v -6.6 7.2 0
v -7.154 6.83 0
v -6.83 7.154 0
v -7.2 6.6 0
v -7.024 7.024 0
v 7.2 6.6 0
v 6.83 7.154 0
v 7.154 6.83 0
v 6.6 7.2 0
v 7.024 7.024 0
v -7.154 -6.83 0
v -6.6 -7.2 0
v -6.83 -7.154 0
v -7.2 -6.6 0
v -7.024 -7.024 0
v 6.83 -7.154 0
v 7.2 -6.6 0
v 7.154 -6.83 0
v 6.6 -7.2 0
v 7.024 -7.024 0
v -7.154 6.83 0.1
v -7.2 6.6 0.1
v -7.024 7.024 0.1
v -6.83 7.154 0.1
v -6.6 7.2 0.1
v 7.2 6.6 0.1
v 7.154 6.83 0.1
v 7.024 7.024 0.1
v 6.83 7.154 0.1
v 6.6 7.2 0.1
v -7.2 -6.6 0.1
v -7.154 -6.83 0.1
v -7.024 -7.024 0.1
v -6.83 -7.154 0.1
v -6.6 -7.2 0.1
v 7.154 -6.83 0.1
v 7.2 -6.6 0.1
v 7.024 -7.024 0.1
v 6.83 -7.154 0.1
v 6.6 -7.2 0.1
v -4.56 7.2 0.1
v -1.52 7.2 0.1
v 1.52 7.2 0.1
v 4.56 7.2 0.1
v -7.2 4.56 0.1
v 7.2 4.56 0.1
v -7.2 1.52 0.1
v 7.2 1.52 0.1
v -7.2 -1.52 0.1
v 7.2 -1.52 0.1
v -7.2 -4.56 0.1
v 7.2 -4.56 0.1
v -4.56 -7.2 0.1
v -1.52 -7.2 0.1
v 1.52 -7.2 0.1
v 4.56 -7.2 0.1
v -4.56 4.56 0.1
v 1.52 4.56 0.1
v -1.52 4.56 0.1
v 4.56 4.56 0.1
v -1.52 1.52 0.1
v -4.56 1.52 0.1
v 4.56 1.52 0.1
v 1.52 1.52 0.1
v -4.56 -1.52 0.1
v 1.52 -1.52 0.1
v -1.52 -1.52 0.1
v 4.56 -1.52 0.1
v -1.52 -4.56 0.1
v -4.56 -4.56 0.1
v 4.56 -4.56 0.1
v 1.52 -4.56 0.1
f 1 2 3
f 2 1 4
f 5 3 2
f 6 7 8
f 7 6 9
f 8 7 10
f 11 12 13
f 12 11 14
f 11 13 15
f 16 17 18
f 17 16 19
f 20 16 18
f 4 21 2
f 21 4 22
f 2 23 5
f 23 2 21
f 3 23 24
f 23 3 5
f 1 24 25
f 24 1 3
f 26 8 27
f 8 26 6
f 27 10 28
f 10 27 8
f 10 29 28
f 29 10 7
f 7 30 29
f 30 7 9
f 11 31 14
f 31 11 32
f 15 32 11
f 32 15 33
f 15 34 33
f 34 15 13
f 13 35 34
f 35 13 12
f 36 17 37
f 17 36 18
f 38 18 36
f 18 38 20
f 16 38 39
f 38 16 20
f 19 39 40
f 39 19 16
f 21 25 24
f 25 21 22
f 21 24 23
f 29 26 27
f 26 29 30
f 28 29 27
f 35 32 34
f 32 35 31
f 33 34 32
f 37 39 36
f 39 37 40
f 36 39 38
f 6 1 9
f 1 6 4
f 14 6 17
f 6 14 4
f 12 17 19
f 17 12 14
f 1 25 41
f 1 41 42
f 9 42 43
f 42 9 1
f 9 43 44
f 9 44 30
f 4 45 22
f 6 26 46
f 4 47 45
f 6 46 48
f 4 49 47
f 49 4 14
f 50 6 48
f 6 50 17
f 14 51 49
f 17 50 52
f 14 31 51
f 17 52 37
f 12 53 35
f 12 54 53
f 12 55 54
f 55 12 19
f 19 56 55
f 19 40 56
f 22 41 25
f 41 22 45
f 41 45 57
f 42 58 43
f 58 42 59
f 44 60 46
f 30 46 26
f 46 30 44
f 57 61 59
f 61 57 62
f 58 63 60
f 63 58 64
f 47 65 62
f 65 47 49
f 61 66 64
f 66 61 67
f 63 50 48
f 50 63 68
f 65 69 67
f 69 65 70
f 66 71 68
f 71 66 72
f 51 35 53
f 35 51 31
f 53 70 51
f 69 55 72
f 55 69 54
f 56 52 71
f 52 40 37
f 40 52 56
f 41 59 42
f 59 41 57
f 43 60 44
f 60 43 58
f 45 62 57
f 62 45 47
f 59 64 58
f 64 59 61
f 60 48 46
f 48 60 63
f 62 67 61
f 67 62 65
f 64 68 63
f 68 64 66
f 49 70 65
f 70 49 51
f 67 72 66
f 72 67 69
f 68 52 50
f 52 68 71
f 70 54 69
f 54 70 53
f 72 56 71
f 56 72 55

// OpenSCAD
// file: ../p/1-4cyli.scad
use <../lib.scad>
function ldraw_lib__1_4cyli() = [
// 0 Cylinder 0.25
// 0 Name: 1-4cyli.dat
// 0 Author: James Jessiman
// 0 !LDRAW_ORG Primitive UPDATE 2012-01
// 0 !LICENSE Licensed under CC BY 4.0 : see CAreadme.txt
// 
// 0 BFC CERTIFY CCW
  [0,"BFC","CERTIFY"],
  [0,"BFC","CCW"],
// 
// 0 !HISTORY 2002-03-23 [sbliss] Added BFC statement.
// 0 !HISTORY 2002-04-25 [PTadmin] Official Update 2002-02
// 0 !HISTORY 2007-06-22 [PTadmin] Header formatted for Contributor Agreement
// 0 !HISTORY 2008-07-01 [PTadmin] Official Update 2008-01
// 0 !HISTORY 2012-02-16 [Philo] Changed to CCW
// 0 !HISTORY 2012-03-30 [PTadmin] Official Update 2012-01
// 
// 
// 4 16 1 1 0 0.9239 1 0.3827 0.9239 0 0.3827 1 0 0
  [4,16,1,1,0,0.9239,1,0.3827,0.9239,0,0.3827,1,0,0],
// 5 24 1 0 0 1 1 0 0.9239 0 0.3827 1 0 -1
  [5,24,1,0,0,1,1,0,0.9239,0,0.3827,1,0,-1],
// 4 16 0.9239 1 0.3827 0.7071 1 0.7071 0.7071 0 0.7071 0.9239 0 0.3827
  [4,16,0.9239,1,0.3827,0.7071,1,0.7071,0.7071,0,0.7071,0.9239,0,0.3827],
// 5 24 0.9239 0 0.3827 0.9239 1 0.3827 0.7071 0 0.7071 1 0 0
  [5,24,0.9239,0,0.3827,0.9239,1,0.3827,0.7071,0,0.7071,1,0,0],
// 4 16 0.7071 1 0.7071 0.3827 1 0.9239 0.3827 0 0.9239 0.7071 0 0.7071
  [4,16,0.7071,1,0.7071,0.3827,1,0.9239,0.3827,0,0.9239,0.7071,0,0.7071],
// 5 24 0.7071 0 0.7071 0.7071 1 0.7071 0.3827 0 0.9239 0.9239 0 0.3827
  [5,24,0.7071,0,0.7071,0.7071,1,0.7071,0.3827,0,0.9239,0.9239,0,0.3827],
// 4 16 0.3827 1 0.9239 0 1 1 0 0 1 0.3827 0 0.9239
  [4,16,0.3827,1,0.9239,0,1,1,0,0,1,0.3827,0,0.9239],
// 5 24 0.3827 0 0.9239 0.3827 1 0.9239 0 0 1 0.7071 0 0.7071
  [5,24,0.3827,0,0.9239,0.3827,1,0.9239,0,0,1,0.7071,0,0.7071],
// 5 24 0 0 1 0 1 1 0.3827 0 0.9239 -1 0 1
  [5,24,0,0,1,0,1,1,0.3827,0,0.9239,-1,0,1],
];
module ldraw_lib__1_4cyli(step=0, col=false, unit=2/5, alt=false, line=0.2, solid=!$preview)
    makepoly(ldraw_lib__1_4cyli(), step=step, col=col, unit=unit, alt=alt, line=line, solid=solid);
ldraw_lib__1_4cyli(line=0.2);
// file: ../p/1-4chrd.scad
use <../lib.scad>
function ldraw_lib__1_4chrd() = [
// 0 Chord 0.25
// 0 Name: 1-4chrd.dat
// 0 Author: Tony Hafner [hafhead]
// 0 !LDRAW_ORG Primitive UPDATE 2012-02
// 0 !LICENSE Licensed under CC BY 2.0 and CC BY 4.0 : see CAreadme.txt
// 
// 0 BFC CERTIFY CCW
  [0,"BFC","CERTIFY"],
  [0,"BFC","CCW"],
// 
// 0 !HISTORY 2004-04-22 [PTadmin] Official Update 2004-02
// 0 !HISTORY 2007-10-09 [PTadmin] Header formatted for Contributor Agreement
// 0 !HISTORY 2008-07-01 [PTadmin] Official Update 2008-01
// 0 !HISTORY 2012-08-02 [MMR1988] Re-creation with PrimGen2 and Rectifier
// 0 !HISTORY 2012-08-09 [PTadmin] Official Update 2012-02
// 
// 
// 4 16 0.9239 0 0.3827 0.3827 0 0.9239 0 0 1 1 0 0
  [4,16,0.9239,0,0.3827,0.3827,0,0.9239,0,0,1,1,0,0],
// 3 16 0.7071 0 0.7071 0.3827 0 0.9239 0.9239 0 0.3827
  [3,16,0.7071,0,0.7071,0.3827,0,0.9239,0.9239,0,0.3827],
];
module ldraw_lib__1_4chrd(step=0, col=false, unit=2/5, alt=false, line=0.2, solid=!$preview)
    makepoly(ldraw_lib__1_4chrd(), step=step, col=col, unit=unit, alt=alt, line=line, solid=solid);
ldraw_lib__1_4chrd(line=0.2);
// main file
use <../lib.scad>
use <../p/1-4chrd.scad>
use <../p/1-4cyli.scad>
function ldraw_lib__6142617z() = [
// 0 Sticker  1.8 x  1.8 Chequered
// 0 Name: 6142617z.dat
// 0 Author: Massimo Maso [Sirio]
// 0 !LDRAW_ORG Part UPDATE 2023-02
// 0 !LICENSE Licensed under CC BY 4.0 : see CAreadme.txt
// 
// 0 BFC CERTIFY CCW
  [0,"BFC","CERTIFY"],
  [0,"BFC","CCW"],
// 
// 0 !KEYWORDS Camaro, Chevrolet, Drag, Race, Set 75874, Speed Champions, SS, Z/28
// 
// 0 !HISTORY 2023-04-17 [OrionP] Official Update 2023-02
// 
// 
// 0 // Primitives
// 
// 1 16 -16.5 0 16.5 -1.5 0 0 0 -1 0 0 0 1.5 1-4chrd.dat
  [1,16,-16.5,0,16.5,-1.5,0,0,0,-1,0,0,0,1.5, ldraw_lib__1_4chrd()],
// 1 16 16.5 0 16.5 1.5 0 0 0 -1 0 0 0 1.5 1-4chrd.dat
  [1,16,16.5,0,16.5,1.5,0,0,0,-1,0,0,0,1.5, ldraw_lib__1_4chrd()],
// 1 16 -16.5 0 -16.5 -1.5 0 0 0 -1 0 0 0 -1.5 1-4chrd.dat
  [1,16,-16.5,0,-16.5,-1.5,0,0,0,-1,0,0,0,-1.5, ldraw_lib__1_4chrd()],
// 1 16 16.5 0 -16.5 1.5 0 0 0 -1 0 0 0 -1.5 1-4chrd.dat
  [1,16,16.5,0,-16.5,1.5,0,0,0,-1,0,0,0,-1.5, ldraw_lib__1_4chrd()],
// 1 16 -16.5 0 16.5 -1.5 0 0 0 -.25 0 0 0 1.5 1-4cyli.dat
  [1,16,-16.5,0,16.5,-1.5,0,0,0,-.25,0,0,0,1.5, ldraw_lib__1_4cyli()],
// 1 16 16.5 0 16.5 1.5 0 0 0 -.25 0 0 0 1.5 1-4cyli.dat
  [1,16,16.5,0,16.5,1.5,0,0,0,-.25,0,0,0,1.5, ldraw_lib__1_4cyli()],
// 1 16 -16.5 0 -16.5 -1.5 0 0 0 -.25 0 0 0 -1.5 1-4cyli.dat
  [1,16,-16.5,0,-16.5,-1.5,0,0,0,-.25,0,0,0,-1.5, ldraw_lib__1_4cyli()],
// 1 16 16.5 0 -16.5 1.5 0 0 0 -.25 0 0 0 -1.5 1-4cyli.dat
  [1,16,16.5,0,-16.5,1.5,0,0,0,-.25,0,0,0,-1.5, ldraw_lib__1_4cyli()],
// 1 0 -16.5 -.25 16.5 -1.5 0 0 0 1 0 0 0 1.5 1-4chrd.dat
  [1,0,-16.5,-.25,16.5,-1.5,0,0,0,1,0,0,0,1.5, ldraw_lib__1_4chrd()],
// 1 0 16.5 -.25 16.5 1.5 0 0 0 1 0 0 0 1.5 1-4chrd.dat
  [1,0,16.5,-.25,16.5,1.5,0,0,0,1,0,0,0,1.5, ldraw_lib__1_4chrd()],
// 1 0 -16.5 -.25 -16.5 -1.5 0 0 0 1 0 0 0 -1.5 1-4chrd.dat
  [1,0,-16.5,-.25,-16.5,-1.5,0,0,0,1,0,0,0,-1.5, ldraw_lib__1_4chrd()],
// 1 0 16.5 -.25 -16.5 1.5 0 0 0 1 0 0 0 -1.5 1-4chrd.dat
  [1,0,16.5,-.25,-16.5,1.5,0,0,0,1,0,0,0,-1.5, ldraw_lib__1_4chrd()],
// 0 // Bottom face
// 4 16 16.5 0 18 18 0 16.5 -18 0 16.5 -16.5 0 18
  [4,16,16.5,0,18,18,0,16.5,-18,0,16.5,-16.5,0,18],
// 4 16 18 0 16.5 18 0 -16.5 -18 0 -16.5 -18 0 16.5
  [4,16,18,0,16.5,18,0,-16.5,-18,0,-16.5,-18,0,16.5],
// 4 16 16.5 0 -18 -16.5 0 -18 -18 0 -16.5 18 0 -16.5
  [4,16,16.5,0,-18,-16.5,0,-18,-18,0,-16.5,18,0,-16.5],
// 0 // Lateral face
// 3 16 -16.5 0 18 -16.5 -.25 18 -11.4 -.25 18
  [3,16,-16.5,0,18,-16.5,-.25,18,-11.4,-.25,18],
// 3 16 -16.5 0 18 -11.4 -.25 18 -3.8 -.25 18
  [3,16,-16.5,0,18,-11.4,-.25,18,-3.8,-.25,18],
// 4 16 -16.5 0 18 -3.8 -.25 18 3.8 -.25 18 16.5 0 18
  [4,16,-16.5,0,18,-3.8,-.25,18,3.8,-.25,18,16.5,0,18],
// 3 16 16.5 0 18 3.8 -.25 18 11.4 -.25 18
  [3,16,16.5,0,18,3.8,-.25,18,11.4,-.25,18],
// 3 16 16.5 0 18 11.4 -.25 18 16.5 -.25 18
  [3,16,16.5,0,18,11.4,-.25,18,16.5,-.25,18],
// 3 16 -18 0 16.5 -18 -.25 11.4 -18 -.25 16.5
  [3,16,-18,0,16.5,-18,-.25,11.4,-18,-.25,16.5],
// 3 16 18 0 16.5 18 -.25 16.5 18 -.25 11.4
  [3,16,18,0,16.5,18,-.25,16.5,18,-.25,11.4],
// 3 16 -18 0 16.5 -18 -.25 3.8 -18 -.25 11.4
  [3,16,-18,0,16.5,-18,-.25,3.8,-18,-.25,11.4],
// 3 16 18 0 16.5 18 -.25 11.4 18 -.25 3.8
  [3,16,18,0,16.5,18,-.25,11.4,18,-.25,3.8],
// 4 16 -18 0 16.5 -18 0 -16.5 -18 -.25 -3.8 -18 -.25 3.8
  [4,16,-18,0,16.5,-18,0,-16.5,-18,-.25,-3.8,-18,-.25,3.8],
// 4 16 18 0 16.5 18 -.25 3.8 18 -.25 -3.8 18 0 -16.5
  [4,16,18,0,16.5,18,-.25,3.8,18,-.25,-3.8,18,0,-16.5],
// 3 16 -18 0 -16.5 -18 -.25 -11.4 -18 -.25 -3.8
  [3,16,-18,0,-16.5,-18,-.25,-11.4,-18,-.25,-3.8],
// 3 16 18 0 -16.5 18 -.25 -3.8 18 -.25 -11.4
  [3,16,18,0,-16.5,18,-.25,-3.8,18,-.25,-11.4],
// 3 16 -18 0 -16.5 -18 -.25 -16.5 -18 -.25 -11.4
  [3,16,-18,0,-16.5,-18,-.25,-16.5,-18,-.25,-11.4],
// 3 16 18 0 -16.5 18 -.25 -11.4 18 -.25 -16.5
  [3,16,18,0,-16.5,18,-.25,-11.4,18,-.25,-16.5],
// 3 16 -16.5 0 -18 -11.4 -.25 -18 -16.5 -.25 -18
  [3,16,-16.5,0,-18,-11.4,-.25,-18,-16.5,-.25,-18],
// 3 16 -16.5 0 -18 -3.8 -.25 -18 -11.4 -.25 -18
  [3,16,-16.5,0,-18,-3.8,-.25,-18,-11.4,-.25,-18],
// 4 16 -16.5 0 -18 16.5 0 -18 3.8 -.25 -18 -3.8 -.25 -18
  [4,16,-16.5,0,-18,16.5,0,-18,3.8,-.25,-18,-3.8,-.25,-18],
// 3 16 16.5 0 -18 11.4 -.25 -18 3.8 -.25 -18
  [3,16,16.5,0,-18,11.4,-.25,-18,3.8,-.25,-18],
// 3 16 16.5 0 -18 16.5 -.25 -18 11.4 -.25 -18
  [3,16,16.5,0,-18,16.5,-.25,-18,11.4,-.25,-18],
// 0 // Top face
// 0 // Black faces
// 4 0 -11.4 -.25 18 -16.5 -.25 18 -18 -.25 16.5 -18 -.25 11.4
  [4,0,-11.4,-.25,18,-16.5,-.25,18,-18,-.25,16.5,-18,-.25,11.4],
// 3 0 -11.4 -.25 18 -18 -.25 11.4 -11.4 -.25 11.4
  [3,0,-11.4,-.25,18,-18,-.25,11.4,-11.4,-.25,11.4],
// 4 0 -3.8 -.25 18 -3.8 -.25 11.4 3.8 -.25 11.4 3.8 -.25 18
  [4,0,-3.8,-.25,18,-3.8,-.25,11.4,3.8,-.25,11.4,3.8,-.25,18],
// 3 0 11.4 -.25 18 11.4 -.25 11.4 18 -.25 11.4
  [3,0,11.4,-.25,18,11.4,-.25,11.4,18,-.25,11.4],
// 4 0 11.4 -.25 18 18 -.25 11.4 18 -.25 16.5 16.5 -.25 18
  [4,0,11.4,-.25,18,18,-.25,11.4,18,-.25,16.5,16.5,-.25,18],
// 4 0 -11.4 -.25 11.4 -11.4 -.25 3.8 -3.8 -.25 3.8 -3.8 -.25 11.4
  [4,0,-11.4,-.25,11.4,-11.4,-.25,3.8,-3.8,-.25,3.8,-3.8,-.25,11.4],
// 4 0 3.8 -.25 11.4 3.8 -.25 3.8 11.4 -.25 3.8 11.4 -.25 11.4
  [4,0,3.8,-.25,11.4,3.8,-.25,3.8,11.4,-.25,3.8,11.4,-.25,11.4],
// 4 0 -18 -.25 3.8 -18 -.25 -3.8 -11.4 -.25 -3.8 -11.4 -.25 3.8
  [4,0,-18,-.25,3.8,-18,-.25,-3.8,-11.4,-.25,-3.8,-11.4,-.25,3.8],
// 4 0 -3.8 -.25 3.8 -3.8 -.25 -3.8 3.8 -.25 -3.8 3.8 -.25 3.8
  [4,0,-3.8,-.25,3.8,-3.8,-.25,-3.8,3.8,-.25,-3.8,3.8,-.25,3.8],
// 4 0 11.4 -.25 3.8 11.4 -.25 -3.8 18 -.25 -3.8 18 -.25 3.8
  [4,0,11.4,-.25,3.8,11.4,-.25,-3.8,18,-.25,-3.8,18,-.25,3.8],
// 4 0 -11.4 -.25 -3.8 -11.4 -.25 -11.4 -3.8 -.25 -11.4 -3.8 -.25 -3.8
  [4,0,-11.4,-.25,-3.8,-11.4,-.25,-11.4,-3.8,-.25,-11.4,-3.8,-.25,-3.8],
// 4 0 3.8 -.25 -3.8 3.8 -.25 -11.4 11.4 -.25 -11.4 11.4 -.25 -3.8
  [4,0,3.8,-.25,-3.8,3.8,-.25,-11.4,11.4,-.25,-11.4,11.4,-.25,-3.8],
// 4 0 -11.4 -.25 -18 -18 -.25 -11.4 -18 -.25 -16.5 -16.5 -.25 -18
  [4,0,-11.4,-.25,-18,-18,-.25,-11.4,-18,-.25,-16.5,-16.5,-.25,-18],
// 3 0 -11.4 -.25 -18 -11.4 -.25 -11.4 -18 -.25 -11.4
  [3,0,-11.4,-.25,-18,-11.4,-.25,-11.4,-18,-.25,-11.4],
// 4 0 -3.8 -.25 -11.4 -3.8 -.25 -18 3.8 -.25 -18 3.8 -.25 -11.4
  [4,0,-3.8,-.25,-11.4,-3.8,-.25,-18,3.8,-.25,-18,3.8,-.25,-11.4],
// 3 0 11.4 -.25 -18 18 -.25 -11.4 11.4 -.25 -11.4
  [3,0,11.4,-.25,-18,18,-.25,-11.4,11.4,-.25,-11.4],
// 4 0 11.4 -.25 -18 16.5 -.25 -18 18 -.25 -16.5 18 -.25 -11.4
  [4,0,11.4,-.25,-18,16.5,-.25,-18,18,-.25,-16.5,18,-.25,-11.4],
// 0 // White faces
// 4 15 -11.4 -.25 18 -11.4 -.25 11.4 -3.8 -.25 11.4 -3.8 -.25 18
  [4,15,-11.4,-.25,18,-11.4,-.25,11.4,-3.8,-.25,11.4,-3.8,-.25,18],
// 4 15 3.8 -.25 18 3.8 -.25 11.4 11.4 -.25 11.4 11.4 -.25 18
  [4,15,3.8,-.25,18,3.8,-.25,11.4,11.4,-.25,11.4,11.4,-.25,18],
// 4 15 -18 -.25 11.4 -18 -.25 3.8 -11.4 -.25 3.8 -11.4 -.25 11.4
  [4,15,-18,-.25,11.4,-18,-.25,3.8,-11.4,-.25,3.8,-11.4,-.25,11.4],
// 4 15 -3.8 -.25 11.4 -3.8 -.25 3.8 3.8 -.25 3.8 3.8 -.25 11.4
  [4,15,-3.8,-.25,11.4,-3.8,-.25,3.8,3.8,-.25,3.8,3.8,-.25,11.4],
// 4 15 11.4 -.25 11.4 11.4 -.25 3.8 18 -.25 3.8 18 -.25 11.4
  [4,15,11.4,-.25,11.4,11.4,-.25,3.8,18,-.25,3.8,18,-.25,11.4],
// 4 15 -11.4 -.25 3.8 -11.4 -.25 -3.8 -3.8 -.25 -3.8 -3.8 -.25 3.8
  [4,15,-11.4,-.25,3.8,-11.4,-.25,-3.8,-3.8,-.25,-3.8,-3.8,-.25,3.8],
// 4 15 3.8 -.25 3.8 3.8 -.25 -3.8 11.4 -.25 -3.8 11.4 -.25 3.8
  [4,15,3.8,-.25,3.8,3.8,-.25,-3.8,11.4,-.25,-3.8,11.4,-.25,3.8],
// 4 15 -18 -.25 -3.8 -18 -.25 -11.4 -11.4 -.25 -11.4 -11.4 -.25 -3.8
  [4,15,-18,-.25,-3.8,-18,-.25,-11.4,-11.4,-.25,-11.4,-11.4,-.25,-3.8],
// 4 15 -3.8 -.25 -3.8 -3.8 -.25 -11.4 3.8 -.25 -11.4 3.8 -.25 -3.8
  [4,15,-3.8,-.25,-3.8,-3.8,-.25,-11.4,3.8,-.25,-11.4,3.8,-.25,-3.8],
// 4 15 11.4 -.25 -3.8 11.4 -.25 -11.4 18 -.25 -11.4 18 -.25 -3.8
  [4,15,11.4,-.25,-3.8,11.4,-.25,-11.4,18,-.25,-11.4,18,-.25,-3.8],
// 4 15 -11.4 -.25 -11.4 -11.4 -.25 -18 -3.8 -.25 -18 -3.8 -.25 -11.4
  [4,15,-11.4,-.25,-11.4,-11.4,-.25,-18,-3.8,-.25,-18,-3.8,-.25,-11.4],
// 4 15 3.8 -.25 -11.4 3.8 -.25 -18 11.4 -.25 -18 11.4 -.25 -11.4
  [4,15,3.8,-.25,-11.4,3.8,-.25,-18,11.4,-.25,-18,11.4,-.25,-11.4],
];
module ldraw_lib__6142617z(step=0, col=false, unit=2/5, alt=false, line=0.2, solid=!$preview)
    makepoly(ldraw_lib__6142617z(), step=step, col=col, unit=unit, alt=alt, line=line, solid=solid);
ldraw_lib__6142617z(line=0.2);
